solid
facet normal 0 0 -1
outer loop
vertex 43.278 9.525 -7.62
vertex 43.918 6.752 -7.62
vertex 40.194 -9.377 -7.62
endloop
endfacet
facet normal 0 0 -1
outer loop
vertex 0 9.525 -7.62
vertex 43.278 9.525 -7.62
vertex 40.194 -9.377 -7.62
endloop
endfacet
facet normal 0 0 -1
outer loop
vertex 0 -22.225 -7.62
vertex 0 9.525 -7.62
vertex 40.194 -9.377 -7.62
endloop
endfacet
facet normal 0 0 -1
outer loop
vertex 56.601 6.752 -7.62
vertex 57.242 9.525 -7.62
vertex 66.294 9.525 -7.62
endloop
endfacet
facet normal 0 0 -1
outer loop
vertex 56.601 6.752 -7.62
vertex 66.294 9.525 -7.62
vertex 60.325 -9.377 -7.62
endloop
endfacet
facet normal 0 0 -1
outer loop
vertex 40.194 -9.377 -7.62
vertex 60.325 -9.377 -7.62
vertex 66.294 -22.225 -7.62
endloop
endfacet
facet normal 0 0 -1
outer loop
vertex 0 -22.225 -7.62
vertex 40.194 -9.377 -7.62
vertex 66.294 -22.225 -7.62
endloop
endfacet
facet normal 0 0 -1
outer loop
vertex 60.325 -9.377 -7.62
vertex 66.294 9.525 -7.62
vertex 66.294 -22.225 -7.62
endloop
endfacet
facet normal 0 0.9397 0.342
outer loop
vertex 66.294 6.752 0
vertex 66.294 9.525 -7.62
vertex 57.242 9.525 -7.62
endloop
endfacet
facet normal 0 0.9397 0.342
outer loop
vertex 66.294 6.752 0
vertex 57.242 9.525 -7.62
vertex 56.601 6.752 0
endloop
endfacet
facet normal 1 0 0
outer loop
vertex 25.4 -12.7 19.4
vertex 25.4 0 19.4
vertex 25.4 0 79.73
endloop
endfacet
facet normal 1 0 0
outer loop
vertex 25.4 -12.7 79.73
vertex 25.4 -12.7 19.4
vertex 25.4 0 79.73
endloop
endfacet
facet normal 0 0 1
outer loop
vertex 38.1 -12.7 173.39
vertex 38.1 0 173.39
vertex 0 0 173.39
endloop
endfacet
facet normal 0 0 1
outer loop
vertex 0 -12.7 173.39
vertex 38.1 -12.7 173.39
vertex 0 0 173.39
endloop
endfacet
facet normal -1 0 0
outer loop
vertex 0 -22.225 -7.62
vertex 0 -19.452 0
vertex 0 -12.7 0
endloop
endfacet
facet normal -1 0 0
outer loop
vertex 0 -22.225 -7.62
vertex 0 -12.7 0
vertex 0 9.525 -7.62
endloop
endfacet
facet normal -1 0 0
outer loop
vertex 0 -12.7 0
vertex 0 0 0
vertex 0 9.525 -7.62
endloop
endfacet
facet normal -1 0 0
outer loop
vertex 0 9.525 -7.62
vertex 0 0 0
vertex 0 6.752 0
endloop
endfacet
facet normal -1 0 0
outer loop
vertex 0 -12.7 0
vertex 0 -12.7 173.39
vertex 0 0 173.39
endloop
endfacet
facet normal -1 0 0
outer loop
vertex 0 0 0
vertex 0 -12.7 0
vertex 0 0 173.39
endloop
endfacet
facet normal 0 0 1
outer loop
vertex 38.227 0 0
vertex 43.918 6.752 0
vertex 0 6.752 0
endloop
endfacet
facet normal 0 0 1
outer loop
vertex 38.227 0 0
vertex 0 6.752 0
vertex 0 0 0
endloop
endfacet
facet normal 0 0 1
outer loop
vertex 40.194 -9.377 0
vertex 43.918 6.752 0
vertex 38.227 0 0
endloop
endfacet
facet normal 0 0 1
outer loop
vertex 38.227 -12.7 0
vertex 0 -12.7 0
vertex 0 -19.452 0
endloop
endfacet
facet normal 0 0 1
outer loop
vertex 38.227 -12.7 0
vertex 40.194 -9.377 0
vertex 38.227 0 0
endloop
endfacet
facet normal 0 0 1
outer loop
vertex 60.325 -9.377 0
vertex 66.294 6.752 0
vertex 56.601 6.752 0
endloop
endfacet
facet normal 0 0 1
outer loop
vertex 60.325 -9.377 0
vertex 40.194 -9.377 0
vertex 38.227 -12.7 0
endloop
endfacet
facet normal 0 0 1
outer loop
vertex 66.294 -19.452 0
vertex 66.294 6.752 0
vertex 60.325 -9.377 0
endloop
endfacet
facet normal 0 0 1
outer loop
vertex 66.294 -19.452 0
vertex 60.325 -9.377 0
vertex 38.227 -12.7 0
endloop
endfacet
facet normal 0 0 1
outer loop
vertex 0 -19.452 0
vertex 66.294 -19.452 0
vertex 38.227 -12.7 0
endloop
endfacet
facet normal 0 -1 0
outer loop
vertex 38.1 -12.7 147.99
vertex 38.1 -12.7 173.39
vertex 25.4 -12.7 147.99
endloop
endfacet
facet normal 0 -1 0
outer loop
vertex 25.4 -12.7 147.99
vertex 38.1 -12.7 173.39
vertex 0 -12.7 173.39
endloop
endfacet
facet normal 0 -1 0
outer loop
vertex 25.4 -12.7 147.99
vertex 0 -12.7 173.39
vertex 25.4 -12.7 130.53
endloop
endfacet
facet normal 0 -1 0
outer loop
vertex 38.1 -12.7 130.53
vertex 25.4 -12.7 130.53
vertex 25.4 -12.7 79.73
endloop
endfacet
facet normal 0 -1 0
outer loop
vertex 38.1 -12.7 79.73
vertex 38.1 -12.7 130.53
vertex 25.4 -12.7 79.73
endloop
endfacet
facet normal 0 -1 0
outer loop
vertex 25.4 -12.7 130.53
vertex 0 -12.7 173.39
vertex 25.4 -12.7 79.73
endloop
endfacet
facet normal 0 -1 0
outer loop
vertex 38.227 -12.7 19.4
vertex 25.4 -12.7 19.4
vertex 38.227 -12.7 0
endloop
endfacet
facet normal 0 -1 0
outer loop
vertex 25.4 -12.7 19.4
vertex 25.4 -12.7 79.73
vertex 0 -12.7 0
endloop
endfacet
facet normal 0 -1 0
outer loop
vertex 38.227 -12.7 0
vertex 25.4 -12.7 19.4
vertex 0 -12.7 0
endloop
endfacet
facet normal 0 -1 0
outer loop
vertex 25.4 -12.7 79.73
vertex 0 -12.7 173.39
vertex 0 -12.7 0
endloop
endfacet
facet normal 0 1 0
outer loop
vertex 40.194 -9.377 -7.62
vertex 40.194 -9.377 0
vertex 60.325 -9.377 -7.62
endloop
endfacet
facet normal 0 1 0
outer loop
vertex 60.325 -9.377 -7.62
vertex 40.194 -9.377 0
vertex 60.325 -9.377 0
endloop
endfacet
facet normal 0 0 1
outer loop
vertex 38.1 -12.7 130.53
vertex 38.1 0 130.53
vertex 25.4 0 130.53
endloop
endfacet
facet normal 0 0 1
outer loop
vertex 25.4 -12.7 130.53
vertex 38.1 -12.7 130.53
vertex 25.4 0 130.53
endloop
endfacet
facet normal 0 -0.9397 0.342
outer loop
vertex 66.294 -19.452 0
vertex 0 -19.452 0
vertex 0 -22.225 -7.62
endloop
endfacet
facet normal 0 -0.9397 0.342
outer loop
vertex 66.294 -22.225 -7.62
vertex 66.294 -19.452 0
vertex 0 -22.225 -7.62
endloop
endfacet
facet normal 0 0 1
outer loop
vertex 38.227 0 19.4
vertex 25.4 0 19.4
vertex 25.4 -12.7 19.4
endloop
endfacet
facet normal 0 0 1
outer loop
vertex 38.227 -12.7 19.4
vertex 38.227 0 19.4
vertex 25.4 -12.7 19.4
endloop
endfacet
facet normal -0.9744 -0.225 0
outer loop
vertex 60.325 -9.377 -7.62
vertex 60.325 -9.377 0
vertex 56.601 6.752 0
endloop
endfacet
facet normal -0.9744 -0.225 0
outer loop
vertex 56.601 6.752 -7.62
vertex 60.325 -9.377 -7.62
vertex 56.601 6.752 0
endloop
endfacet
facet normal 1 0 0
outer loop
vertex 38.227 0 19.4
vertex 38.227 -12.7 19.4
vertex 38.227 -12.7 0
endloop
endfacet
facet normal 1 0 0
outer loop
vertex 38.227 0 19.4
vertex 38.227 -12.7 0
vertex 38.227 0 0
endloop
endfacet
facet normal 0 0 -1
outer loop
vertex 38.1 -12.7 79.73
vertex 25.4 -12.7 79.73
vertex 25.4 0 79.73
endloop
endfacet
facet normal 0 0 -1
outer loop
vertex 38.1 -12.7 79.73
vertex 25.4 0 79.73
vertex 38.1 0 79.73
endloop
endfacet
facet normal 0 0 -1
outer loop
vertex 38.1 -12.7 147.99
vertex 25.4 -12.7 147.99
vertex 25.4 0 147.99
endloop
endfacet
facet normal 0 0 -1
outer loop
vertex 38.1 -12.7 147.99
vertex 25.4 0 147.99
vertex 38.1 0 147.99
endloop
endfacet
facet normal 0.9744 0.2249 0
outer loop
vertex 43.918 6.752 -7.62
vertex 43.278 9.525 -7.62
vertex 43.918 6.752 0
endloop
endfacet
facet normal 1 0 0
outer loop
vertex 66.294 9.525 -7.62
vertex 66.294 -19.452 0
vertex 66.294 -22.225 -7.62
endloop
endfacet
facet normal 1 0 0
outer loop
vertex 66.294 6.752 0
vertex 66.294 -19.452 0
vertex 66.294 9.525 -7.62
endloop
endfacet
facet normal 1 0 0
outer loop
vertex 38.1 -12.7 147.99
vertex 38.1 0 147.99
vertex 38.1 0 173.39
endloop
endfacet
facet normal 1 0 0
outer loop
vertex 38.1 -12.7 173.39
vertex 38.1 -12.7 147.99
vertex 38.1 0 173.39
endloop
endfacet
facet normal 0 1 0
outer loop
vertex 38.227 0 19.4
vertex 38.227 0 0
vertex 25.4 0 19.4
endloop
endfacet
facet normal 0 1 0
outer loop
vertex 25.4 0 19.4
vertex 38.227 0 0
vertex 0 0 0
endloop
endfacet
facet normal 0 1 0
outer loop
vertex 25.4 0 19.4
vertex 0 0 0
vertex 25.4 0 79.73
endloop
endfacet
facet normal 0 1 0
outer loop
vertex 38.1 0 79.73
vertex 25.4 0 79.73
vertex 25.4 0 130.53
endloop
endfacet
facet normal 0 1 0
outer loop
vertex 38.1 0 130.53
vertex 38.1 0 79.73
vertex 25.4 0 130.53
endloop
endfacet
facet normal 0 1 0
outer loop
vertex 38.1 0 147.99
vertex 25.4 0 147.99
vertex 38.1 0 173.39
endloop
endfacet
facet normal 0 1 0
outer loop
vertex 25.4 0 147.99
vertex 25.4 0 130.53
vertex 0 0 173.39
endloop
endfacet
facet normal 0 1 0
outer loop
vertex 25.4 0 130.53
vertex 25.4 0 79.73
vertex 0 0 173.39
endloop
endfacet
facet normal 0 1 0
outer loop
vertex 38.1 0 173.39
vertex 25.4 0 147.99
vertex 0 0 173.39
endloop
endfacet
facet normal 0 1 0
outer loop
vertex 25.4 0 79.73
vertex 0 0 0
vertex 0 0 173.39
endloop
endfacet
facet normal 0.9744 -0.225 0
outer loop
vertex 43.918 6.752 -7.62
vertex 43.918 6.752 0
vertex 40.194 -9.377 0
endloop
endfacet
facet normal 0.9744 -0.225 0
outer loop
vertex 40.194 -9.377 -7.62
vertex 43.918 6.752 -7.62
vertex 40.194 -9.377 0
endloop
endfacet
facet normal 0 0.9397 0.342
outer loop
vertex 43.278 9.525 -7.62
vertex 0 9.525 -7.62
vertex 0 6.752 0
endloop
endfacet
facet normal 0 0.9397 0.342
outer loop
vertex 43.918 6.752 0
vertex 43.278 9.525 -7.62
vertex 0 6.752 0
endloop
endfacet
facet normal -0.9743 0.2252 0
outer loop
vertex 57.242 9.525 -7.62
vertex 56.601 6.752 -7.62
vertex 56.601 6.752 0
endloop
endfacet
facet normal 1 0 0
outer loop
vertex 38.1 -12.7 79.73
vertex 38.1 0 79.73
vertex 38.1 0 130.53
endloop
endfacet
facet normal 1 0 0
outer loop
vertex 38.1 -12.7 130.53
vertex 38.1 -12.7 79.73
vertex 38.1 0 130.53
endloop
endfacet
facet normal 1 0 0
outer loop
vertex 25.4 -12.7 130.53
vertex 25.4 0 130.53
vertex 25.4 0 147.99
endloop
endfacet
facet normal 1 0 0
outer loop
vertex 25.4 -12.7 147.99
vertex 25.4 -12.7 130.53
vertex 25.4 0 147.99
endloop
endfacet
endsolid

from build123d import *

# Parameters (mm, degrees)
F1_DEPTH  = 12.7
F3_DEPTH  = 38.1
F4_W      = 14.7766079754
F4_H      = 8.8374735788
F5_DEPTH  = 3.175
F7_DEPTH  = 66.675
F8_W      = 12.7
F8_H      = 19.4
F9_DEPTH  = 66.548
F10_DEPTH = 34.925
F11_W     = 34.925
F11_H     = 31.75
F12_DEPTH = 25.4
F13_W     = 3.175
F13_H     = 31.75
F14_DEPTH = 25.4
F15_DEPTH = 3.175
F17_DEPTH = 8.128
F19_DEPTH = 0.381


with BuildPart() as f1:
    # F0 (on Front) → F1 (new body)
    with BuildSketch(Plane.XZ):
        Polygon((0, 173.39), (0, 0), (38.1, 0), (38.1, 19.4), (25.4, 19.4), (25.4, 79.73), (38.1, 79.73), (38.1, 130.53), (25.4, 130.53), (25.4, 147.99), (38.1, 147.99), (38.1, 173.39), align=None)
    extrude(amount=F1_DEPTH)

    # F2 (on face) → F3 (join)
    with BuildSketch(Plane.YZ.offset(38.1)):
        Polygon((0, -7.62), (-2.7734531851, 0), (-9.9265468149, 0), (-12.7, -7.62), align=None)
    extrude(amount=-F3_DEPTH)

    # F4 (on face) → F5 (cut)
    with BuildSketch(Plane(origin=(0, 0, 0), x_dir=(0, -1, 0), z_dir=(-1, 0, 0))):
        with Locations((7.3883039877, -4.4187367894)):
            Rectangle(F4_W, F4_H)
    extrude(amount=-F5_DEPTH, mode=Mode.SUBTRACT)

    # F6 (on face) → F7 (join)
    with BuildSketch(Plane.YZ.offset(38.1)):
        Polygon((-12.7, -7.62), (-9.9265468149, 0), (-12.7, 0), (-19.4515468149, 0), (-22.225, -7.62), align=None)
        Polygon((0, -7.62), (-2.7734531851, 0), (-9.9265468149, 0), (-12.7, -7.62), align=None)
        Polygon((-2.7734531851, 0), (0, 0), (0, 19.4), (-12.7, 19.4), (-12.7, 0), (-9.9265468149, 0), align=None)
        Polygon((6.7515468149, 0), (0, 0), (-2.7734531851, 0), (0, -7.62), (9.525, -7.62), align=None)
    extrude(amount=F7_DEPTH)

    # F8 (on face) → F9 (cut)
    with BuildSketch(Plane.YZ.offset(104.775)):
        with Locations((-6.35, 9.7)):
            Rectangle(F8_W, F8_H)
    extrude(amount=-F9_DEPTH, mode=Mode.SUBTRACT)

    # F6 (on face) → F10 (join)
    with BuildSketch(Plane.YZ.offset(38.1)):
        Polygon((6.7515468149, 0), (0, 0), (-2.7734531851, 0), (0, -7.62), (9.525, -7.62), align=None)
        Polygon((-12.7, -7.62), (-9.9265468149, 0), (-12.7, 0), (-19.4515468149, 0), (-22.225, -7.62), align=None)
    extrude(amount=-F10_DEPTH)

    # F11 (on face) → F12 (cut)
    with BuildSketch(Plane(origin=(0, 0, -7.62), x_dir=(1, 0, 0), z_dir=(0, 0, -1))):
        with Locations((87.3125, 6.35)):
            Rectangle(F11_W, F11_H)
    extrude(amount=-F12_DEPTH, mode=Mode.SUBTRACT)

    # F13 (on face) → F14 (cut)
    with BuildSketch(Plane(origin=(0, 0, -7.62), x_dir=(1, 0, 0), z_dir=(0, 0, -1))):
        with Locations((68.2625, 6.35)):
            Rectangle(F13_W, F13_H)
    extrude(amount=-F14_DEPTH, mode=Mode.SUBTRACT)

    # F15 (add): a face of the model
    f15_faces = [f1.faces().sort_by_distance(p)[0] for p in [
        (3.175, -6.35, -3.9315564286),
    ]]
    extrude(f15_faces, amount=F15_DEPTH)

    # F16 (on face) → F17 (cut)
    with BuildSketch(Plane.XY):
        Polygon((43.9181570547, 6.7515468149), (40.194484, -9.3774531851), (60.325, -9.3774531851), (56.6013269453, 6.7515468149), align=None)
        Polygon((40.194484, 22.8805468149), (43.9181570547, 6.7515468149), (56.6013269453, 6.7515468149), (60.325, 22.8805468149), align=None)
    extrude(amount=-F17_DEPTH, mode=Mode.SUBTRACT)

    # F18 (on face) → F19 (cut)
    with BuildSketch(Plane.YZ.offset(66.675)):
        Polygon((-19.4515468149, 0), (-22.225, -7.62), (9.525, -7.62), (6.7515468149, 0), align=None)
    extrude(amount=-F19_DEPTH, mode=Mode.SUBTRACT)


solid = f1.part
